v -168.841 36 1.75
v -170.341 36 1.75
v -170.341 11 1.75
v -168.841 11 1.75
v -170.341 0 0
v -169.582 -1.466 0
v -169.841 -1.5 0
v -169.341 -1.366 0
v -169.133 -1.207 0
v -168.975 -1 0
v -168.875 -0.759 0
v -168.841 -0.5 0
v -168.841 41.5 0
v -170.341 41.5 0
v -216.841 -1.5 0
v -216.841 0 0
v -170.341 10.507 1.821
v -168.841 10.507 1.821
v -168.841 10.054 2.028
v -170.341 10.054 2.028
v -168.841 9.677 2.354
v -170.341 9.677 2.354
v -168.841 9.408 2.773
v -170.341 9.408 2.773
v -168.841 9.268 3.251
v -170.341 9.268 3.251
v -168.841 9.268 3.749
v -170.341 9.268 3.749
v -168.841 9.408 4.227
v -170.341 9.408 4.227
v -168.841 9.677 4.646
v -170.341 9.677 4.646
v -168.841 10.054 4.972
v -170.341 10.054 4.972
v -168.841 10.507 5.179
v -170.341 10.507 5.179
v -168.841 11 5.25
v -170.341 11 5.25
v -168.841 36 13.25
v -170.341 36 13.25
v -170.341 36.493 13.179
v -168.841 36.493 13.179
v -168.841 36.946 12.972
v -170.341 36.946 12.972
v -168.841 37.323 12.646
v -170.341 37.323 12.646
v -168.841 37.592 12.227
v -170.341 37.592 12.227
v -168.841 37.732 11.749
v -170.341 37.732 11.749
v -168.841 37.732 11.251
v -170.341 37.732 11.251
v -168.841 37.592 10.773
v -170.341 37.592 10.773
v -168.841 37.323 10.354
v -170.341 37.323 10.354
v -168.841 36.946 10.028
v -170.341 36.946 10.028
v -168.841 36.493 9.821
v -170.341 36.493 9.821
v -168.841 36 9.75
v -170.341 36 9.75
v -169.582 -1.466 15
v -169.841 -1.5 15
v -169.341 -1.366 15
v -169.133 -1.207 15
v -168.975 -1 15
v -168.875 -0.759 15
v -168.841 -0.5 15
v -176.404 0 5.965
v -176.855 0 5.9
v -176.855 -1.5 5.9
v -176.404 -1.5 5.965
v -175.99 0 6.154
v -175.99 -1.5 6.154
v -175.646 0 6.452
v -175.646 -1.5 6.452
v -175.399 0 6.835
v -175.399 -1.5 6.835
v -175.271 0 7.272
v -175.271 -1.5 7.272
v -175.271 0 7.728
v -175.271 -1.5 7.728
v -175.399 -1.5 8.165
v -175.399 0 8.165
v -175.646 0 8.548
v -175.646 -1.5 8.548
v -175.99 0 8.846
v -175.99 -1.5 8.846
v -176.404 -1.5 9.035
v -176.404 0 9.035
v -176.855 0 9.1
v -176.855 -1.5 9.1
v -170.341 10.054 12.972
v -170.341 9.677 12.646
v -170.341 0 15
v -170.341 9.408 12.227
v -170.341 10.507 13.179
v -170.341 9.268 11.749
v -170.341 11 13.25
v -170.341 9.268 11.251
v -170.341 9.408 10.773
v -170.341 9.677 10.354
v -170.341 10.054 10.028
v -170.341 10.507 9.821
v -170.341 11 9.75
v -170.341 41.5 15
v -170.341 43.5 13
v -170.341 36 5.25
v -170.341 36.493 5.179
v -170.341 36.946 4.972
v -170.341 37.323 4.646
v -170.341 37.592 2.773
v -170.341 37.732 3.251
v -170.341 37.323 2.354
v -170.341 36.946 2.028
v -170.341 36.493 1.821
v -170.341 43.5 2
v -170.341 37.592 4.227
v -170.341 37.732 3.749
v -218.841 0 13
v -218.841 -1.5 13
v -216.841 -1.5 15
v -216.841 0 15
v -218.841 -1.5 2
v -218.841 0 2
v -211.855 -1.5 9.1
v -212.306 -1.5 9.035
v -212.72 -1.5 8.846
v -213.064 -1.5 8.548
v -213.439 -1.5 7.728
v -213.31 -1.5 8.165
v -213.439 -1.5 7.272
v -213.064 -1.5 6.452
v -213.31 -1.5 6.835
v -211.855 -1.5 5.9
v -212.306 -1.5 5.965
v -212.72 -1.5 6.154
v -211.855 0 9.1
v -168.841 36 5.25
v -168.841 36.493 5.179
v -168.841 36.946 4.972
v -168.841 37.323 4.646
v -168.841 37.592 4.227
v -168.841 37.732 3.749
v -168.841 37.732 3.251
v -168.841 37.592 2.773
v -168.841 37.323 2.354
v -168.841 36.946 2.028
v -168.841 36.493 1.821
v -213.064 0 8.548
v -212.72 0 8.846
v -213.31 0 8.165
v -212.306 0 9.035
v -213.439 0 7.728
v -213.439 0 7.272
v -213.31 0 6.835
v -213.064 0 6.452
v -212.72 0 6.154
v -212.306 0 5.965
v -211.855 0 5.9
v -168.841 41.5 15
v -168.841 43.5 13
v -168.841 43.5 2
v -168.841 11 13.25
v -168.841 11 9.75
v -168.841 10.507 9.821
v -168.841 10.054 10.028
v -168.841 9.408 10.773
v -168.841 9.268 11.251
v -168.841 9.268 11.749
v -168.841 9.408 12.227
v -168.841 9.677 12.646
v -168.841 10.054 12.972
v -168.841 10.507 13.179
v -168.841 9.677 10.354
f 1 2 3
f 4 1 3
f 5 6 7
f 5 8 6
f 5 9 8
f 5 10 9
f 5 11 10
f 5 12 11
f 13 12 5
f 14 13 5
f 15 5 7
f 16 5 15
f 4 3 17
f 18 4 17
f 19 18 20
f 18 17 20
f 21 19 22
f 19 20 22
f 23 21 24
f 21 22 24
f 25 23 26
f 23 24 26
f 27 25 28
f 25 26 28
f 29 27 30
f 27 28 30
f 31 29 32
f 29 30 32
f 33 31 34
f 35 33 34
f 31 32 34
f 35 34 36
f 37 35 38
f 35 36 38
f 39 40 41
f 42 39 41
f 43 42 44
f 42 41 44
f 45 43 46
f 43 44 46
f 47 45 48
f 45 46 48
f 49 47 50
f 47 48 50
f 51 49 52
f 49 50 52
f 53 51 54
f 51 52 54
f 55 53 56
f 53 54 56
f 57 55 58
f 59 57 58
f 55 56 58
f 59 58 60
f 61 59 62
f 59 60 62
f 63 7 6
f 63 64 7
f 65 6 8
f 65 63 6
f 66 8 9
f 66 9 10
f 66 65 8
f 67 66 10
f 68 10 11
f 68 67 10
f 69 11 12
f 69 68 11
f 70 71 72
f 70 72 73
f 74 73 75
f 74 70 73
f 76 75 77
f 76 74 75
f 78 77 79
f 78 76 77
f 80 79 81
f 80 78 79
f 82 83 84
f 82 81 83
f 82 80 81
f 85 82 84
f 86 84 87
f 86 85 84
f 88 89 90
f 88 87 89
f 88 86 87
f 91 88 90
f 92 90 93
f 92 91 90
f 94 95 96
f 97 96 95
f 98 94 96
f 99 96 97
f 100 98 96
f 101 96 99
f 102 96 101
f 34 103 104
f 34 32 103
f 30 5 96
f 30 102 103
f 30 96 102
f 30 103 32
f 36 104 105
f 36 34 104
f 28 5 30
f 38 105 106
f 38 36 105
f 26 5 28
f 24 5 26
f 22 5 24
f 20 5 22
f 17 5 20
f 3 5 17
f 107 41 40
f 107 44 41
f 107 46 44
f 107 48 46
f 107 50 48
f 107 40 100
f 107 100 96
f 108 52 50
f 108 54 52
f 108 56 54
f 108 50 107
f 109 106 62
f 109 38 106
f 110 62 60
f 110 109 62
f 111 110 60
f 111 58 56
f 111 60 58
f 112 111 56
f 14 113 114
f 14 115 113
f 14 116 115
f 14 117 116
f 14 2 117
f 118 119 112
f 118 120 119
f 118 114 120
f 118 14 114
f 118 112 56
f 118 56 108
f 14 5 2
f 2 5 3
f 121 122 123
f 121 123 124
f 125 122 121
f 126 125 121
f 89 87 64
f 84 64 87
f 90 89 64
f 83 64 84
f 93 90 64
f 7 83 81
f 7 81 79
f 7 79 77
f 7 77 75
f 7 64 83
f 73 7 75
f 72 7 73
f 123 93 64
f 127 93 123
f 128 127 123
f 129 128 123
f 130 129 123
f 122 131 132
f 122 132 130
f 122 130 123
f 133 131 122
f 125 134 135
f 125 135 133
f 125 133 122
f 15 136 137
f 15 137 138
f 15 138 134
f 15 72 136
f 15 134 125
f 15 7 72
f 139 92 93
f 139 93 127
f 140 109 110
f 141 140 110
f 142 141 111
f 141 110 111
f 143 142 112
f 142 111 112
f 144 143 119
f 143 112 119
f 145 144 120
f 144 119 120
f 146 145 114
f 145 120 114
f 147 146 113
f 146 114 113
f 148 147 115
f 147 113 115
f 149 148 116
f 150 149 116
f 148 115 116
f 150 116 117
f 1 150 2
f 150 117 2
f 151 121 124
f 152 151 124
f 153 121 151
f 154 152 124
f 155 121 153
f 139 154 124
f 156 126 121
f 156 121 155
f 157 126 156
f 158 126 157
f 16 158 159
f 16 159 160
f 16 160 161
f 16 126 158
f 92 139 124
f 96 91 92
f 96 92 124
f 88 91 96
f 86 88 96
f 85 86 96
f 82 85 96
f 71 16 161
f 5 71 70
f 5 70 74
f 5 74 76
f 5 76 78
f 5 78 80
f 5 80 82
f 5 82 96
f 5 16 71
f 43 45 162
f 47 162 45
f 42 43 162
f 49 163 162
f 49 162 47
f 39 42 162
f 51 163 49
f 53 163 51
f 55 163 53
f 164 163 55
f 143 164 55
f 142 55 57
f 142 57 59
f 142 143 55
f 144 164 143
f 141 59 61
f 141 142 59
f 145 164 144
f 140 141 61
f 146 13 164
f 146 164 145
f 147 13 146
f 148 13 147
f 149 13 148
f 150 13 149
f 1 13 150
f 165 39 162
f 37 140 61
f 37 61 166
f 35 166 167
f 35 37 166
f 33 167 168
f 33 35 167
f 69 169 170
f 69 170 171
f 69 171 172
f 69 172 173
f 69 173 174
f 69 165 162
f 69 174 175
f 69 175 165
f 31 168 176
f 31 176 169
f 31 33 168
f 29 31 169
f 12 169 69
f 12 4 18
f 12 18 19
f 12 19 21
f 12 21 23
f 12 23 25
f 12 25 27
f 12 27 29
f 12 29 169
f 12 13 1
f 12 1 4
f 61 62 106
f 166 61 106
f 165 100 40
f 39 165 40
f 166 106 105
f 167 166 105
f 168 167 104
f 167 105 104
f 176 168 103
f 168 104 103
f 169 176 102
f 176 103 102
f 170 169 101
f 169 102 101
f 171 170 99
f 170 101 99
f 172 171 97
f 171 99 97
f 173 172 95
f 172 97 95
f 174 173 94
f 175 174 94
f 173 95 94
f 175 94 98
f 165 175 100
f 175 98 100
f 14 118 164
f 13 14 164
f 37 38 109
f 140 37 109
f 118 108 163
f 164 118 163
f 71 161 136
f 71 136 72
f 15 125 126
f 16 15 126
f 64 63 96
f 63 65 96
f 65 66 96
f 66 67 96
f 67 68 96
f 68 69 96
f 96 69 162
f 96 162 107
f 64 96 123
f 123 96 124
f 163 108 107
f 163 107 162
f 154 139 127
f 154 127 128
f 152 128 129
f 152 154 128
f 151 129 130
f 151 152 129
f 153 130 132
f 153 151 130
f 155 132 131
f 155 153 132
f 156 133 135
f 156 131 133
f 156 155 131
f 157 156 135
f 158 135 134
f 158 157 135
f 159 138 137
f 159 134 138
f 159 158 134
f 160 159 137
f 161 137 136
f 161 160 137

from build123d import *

# Parameters (mm, degrees)
BOSS_EXTRUDE1_DEPTH = 15
CUT_EXTRUDE1_DEPTH  = 2.5
CUT_EXTRUDE2_DEPTH  = 2.5
CHAMFER1_SIZE       = 2
FILLET1_R           = 1


with BuildPart() as part:
    # Sketch1 → Boss-Extrude1 (new body)
    with BuildSketch(Plane.XY):
        Polygon((-218.84057971, 0), (-170.34057971, 0), (-170.34057971, 43.5), (-168.84057971, 43.5), (-168.84057971, -1.5), (-218.84057971, -1.5), align=None)
    extrude(amount=BOSS_EXTRUDE1_DEPTH)

    # Sketch2 → Cut-Extrude1 (cut, through all)
    with BuildSketch(Plane(origin=(0, 0, 0), x_dir=(1, 0, 0), z_dir=(0, 1, 0))):
        with BuildLine():
            Line((-176.854809789, -9.1), (-211.854809789, -9.1))
            ThreePointArc((-211.854809789, -9.1), (-213.454809789, -7.5), (-211.854809789, -5.9))
            Line((-211.854809789, -5.9), (-176.854809789, -5.9))
            ThreePointArc((-176.854809789, -5.9), (-175.254809789, -7.5), (-176.854809789, -9.1))
        make_face()
    extrude(amount=-CUT_EXTRUDE1_DEPTH, mode=Mode.SUBTRACT)

    # Sketch3 → Cut-Extrude2 (cut, through all)
    with BuildSketch(Plane.ZY.offset(170.34057971)):
        with BuildLine():
            Line((1.75, 36), (1.75, 11))
            ThreePointArc((1.75, 11), (3.5, 9.25), (5.25, 11))
            Line((5.25, 11), (5.25, 36))
            ThreePointArc((5.25, 36), (3.5, 37.75), (1.75, 36))
        make_face()
        with BuildLine():
            Line((9.75, 36), (9.75, 11))
            ThreePointArc((9.75, 11), (11.5, 9.25), (13.25, 11))
            Line((13.25, 11), (13.25, 36))
            ThreePointArc((13.25, 36), (11.5, 37.75), (9.75, 36))
        make_face()
    extrude(amount=-CUT_EXTRUDE2_DEPTH, mode=Mode.SUBTRACT)

    # Chamfer1
    chamfer1_edges = [part.edges().sort_by_distance(p)[0] for p in [
        (-169.59057971, 43.5, 15),
        (-218.84057971, -0.75, 15),
        (-169.59057971, 43.5, 0),
        (-218.84057971, -0.75, 0),
    ]]
    chamfer(chamfer1_edges, length=CHAMFER1_SIZE)

    # Fillet1
    fillet1_edges = [part.edges().sort_by_distance(p)[0] for p in [
        (-168.84057971, -1.5, 7.5),
    ]]
    fillet(fillet1_edges, radius=FILLET1_R)


solid = part.part
